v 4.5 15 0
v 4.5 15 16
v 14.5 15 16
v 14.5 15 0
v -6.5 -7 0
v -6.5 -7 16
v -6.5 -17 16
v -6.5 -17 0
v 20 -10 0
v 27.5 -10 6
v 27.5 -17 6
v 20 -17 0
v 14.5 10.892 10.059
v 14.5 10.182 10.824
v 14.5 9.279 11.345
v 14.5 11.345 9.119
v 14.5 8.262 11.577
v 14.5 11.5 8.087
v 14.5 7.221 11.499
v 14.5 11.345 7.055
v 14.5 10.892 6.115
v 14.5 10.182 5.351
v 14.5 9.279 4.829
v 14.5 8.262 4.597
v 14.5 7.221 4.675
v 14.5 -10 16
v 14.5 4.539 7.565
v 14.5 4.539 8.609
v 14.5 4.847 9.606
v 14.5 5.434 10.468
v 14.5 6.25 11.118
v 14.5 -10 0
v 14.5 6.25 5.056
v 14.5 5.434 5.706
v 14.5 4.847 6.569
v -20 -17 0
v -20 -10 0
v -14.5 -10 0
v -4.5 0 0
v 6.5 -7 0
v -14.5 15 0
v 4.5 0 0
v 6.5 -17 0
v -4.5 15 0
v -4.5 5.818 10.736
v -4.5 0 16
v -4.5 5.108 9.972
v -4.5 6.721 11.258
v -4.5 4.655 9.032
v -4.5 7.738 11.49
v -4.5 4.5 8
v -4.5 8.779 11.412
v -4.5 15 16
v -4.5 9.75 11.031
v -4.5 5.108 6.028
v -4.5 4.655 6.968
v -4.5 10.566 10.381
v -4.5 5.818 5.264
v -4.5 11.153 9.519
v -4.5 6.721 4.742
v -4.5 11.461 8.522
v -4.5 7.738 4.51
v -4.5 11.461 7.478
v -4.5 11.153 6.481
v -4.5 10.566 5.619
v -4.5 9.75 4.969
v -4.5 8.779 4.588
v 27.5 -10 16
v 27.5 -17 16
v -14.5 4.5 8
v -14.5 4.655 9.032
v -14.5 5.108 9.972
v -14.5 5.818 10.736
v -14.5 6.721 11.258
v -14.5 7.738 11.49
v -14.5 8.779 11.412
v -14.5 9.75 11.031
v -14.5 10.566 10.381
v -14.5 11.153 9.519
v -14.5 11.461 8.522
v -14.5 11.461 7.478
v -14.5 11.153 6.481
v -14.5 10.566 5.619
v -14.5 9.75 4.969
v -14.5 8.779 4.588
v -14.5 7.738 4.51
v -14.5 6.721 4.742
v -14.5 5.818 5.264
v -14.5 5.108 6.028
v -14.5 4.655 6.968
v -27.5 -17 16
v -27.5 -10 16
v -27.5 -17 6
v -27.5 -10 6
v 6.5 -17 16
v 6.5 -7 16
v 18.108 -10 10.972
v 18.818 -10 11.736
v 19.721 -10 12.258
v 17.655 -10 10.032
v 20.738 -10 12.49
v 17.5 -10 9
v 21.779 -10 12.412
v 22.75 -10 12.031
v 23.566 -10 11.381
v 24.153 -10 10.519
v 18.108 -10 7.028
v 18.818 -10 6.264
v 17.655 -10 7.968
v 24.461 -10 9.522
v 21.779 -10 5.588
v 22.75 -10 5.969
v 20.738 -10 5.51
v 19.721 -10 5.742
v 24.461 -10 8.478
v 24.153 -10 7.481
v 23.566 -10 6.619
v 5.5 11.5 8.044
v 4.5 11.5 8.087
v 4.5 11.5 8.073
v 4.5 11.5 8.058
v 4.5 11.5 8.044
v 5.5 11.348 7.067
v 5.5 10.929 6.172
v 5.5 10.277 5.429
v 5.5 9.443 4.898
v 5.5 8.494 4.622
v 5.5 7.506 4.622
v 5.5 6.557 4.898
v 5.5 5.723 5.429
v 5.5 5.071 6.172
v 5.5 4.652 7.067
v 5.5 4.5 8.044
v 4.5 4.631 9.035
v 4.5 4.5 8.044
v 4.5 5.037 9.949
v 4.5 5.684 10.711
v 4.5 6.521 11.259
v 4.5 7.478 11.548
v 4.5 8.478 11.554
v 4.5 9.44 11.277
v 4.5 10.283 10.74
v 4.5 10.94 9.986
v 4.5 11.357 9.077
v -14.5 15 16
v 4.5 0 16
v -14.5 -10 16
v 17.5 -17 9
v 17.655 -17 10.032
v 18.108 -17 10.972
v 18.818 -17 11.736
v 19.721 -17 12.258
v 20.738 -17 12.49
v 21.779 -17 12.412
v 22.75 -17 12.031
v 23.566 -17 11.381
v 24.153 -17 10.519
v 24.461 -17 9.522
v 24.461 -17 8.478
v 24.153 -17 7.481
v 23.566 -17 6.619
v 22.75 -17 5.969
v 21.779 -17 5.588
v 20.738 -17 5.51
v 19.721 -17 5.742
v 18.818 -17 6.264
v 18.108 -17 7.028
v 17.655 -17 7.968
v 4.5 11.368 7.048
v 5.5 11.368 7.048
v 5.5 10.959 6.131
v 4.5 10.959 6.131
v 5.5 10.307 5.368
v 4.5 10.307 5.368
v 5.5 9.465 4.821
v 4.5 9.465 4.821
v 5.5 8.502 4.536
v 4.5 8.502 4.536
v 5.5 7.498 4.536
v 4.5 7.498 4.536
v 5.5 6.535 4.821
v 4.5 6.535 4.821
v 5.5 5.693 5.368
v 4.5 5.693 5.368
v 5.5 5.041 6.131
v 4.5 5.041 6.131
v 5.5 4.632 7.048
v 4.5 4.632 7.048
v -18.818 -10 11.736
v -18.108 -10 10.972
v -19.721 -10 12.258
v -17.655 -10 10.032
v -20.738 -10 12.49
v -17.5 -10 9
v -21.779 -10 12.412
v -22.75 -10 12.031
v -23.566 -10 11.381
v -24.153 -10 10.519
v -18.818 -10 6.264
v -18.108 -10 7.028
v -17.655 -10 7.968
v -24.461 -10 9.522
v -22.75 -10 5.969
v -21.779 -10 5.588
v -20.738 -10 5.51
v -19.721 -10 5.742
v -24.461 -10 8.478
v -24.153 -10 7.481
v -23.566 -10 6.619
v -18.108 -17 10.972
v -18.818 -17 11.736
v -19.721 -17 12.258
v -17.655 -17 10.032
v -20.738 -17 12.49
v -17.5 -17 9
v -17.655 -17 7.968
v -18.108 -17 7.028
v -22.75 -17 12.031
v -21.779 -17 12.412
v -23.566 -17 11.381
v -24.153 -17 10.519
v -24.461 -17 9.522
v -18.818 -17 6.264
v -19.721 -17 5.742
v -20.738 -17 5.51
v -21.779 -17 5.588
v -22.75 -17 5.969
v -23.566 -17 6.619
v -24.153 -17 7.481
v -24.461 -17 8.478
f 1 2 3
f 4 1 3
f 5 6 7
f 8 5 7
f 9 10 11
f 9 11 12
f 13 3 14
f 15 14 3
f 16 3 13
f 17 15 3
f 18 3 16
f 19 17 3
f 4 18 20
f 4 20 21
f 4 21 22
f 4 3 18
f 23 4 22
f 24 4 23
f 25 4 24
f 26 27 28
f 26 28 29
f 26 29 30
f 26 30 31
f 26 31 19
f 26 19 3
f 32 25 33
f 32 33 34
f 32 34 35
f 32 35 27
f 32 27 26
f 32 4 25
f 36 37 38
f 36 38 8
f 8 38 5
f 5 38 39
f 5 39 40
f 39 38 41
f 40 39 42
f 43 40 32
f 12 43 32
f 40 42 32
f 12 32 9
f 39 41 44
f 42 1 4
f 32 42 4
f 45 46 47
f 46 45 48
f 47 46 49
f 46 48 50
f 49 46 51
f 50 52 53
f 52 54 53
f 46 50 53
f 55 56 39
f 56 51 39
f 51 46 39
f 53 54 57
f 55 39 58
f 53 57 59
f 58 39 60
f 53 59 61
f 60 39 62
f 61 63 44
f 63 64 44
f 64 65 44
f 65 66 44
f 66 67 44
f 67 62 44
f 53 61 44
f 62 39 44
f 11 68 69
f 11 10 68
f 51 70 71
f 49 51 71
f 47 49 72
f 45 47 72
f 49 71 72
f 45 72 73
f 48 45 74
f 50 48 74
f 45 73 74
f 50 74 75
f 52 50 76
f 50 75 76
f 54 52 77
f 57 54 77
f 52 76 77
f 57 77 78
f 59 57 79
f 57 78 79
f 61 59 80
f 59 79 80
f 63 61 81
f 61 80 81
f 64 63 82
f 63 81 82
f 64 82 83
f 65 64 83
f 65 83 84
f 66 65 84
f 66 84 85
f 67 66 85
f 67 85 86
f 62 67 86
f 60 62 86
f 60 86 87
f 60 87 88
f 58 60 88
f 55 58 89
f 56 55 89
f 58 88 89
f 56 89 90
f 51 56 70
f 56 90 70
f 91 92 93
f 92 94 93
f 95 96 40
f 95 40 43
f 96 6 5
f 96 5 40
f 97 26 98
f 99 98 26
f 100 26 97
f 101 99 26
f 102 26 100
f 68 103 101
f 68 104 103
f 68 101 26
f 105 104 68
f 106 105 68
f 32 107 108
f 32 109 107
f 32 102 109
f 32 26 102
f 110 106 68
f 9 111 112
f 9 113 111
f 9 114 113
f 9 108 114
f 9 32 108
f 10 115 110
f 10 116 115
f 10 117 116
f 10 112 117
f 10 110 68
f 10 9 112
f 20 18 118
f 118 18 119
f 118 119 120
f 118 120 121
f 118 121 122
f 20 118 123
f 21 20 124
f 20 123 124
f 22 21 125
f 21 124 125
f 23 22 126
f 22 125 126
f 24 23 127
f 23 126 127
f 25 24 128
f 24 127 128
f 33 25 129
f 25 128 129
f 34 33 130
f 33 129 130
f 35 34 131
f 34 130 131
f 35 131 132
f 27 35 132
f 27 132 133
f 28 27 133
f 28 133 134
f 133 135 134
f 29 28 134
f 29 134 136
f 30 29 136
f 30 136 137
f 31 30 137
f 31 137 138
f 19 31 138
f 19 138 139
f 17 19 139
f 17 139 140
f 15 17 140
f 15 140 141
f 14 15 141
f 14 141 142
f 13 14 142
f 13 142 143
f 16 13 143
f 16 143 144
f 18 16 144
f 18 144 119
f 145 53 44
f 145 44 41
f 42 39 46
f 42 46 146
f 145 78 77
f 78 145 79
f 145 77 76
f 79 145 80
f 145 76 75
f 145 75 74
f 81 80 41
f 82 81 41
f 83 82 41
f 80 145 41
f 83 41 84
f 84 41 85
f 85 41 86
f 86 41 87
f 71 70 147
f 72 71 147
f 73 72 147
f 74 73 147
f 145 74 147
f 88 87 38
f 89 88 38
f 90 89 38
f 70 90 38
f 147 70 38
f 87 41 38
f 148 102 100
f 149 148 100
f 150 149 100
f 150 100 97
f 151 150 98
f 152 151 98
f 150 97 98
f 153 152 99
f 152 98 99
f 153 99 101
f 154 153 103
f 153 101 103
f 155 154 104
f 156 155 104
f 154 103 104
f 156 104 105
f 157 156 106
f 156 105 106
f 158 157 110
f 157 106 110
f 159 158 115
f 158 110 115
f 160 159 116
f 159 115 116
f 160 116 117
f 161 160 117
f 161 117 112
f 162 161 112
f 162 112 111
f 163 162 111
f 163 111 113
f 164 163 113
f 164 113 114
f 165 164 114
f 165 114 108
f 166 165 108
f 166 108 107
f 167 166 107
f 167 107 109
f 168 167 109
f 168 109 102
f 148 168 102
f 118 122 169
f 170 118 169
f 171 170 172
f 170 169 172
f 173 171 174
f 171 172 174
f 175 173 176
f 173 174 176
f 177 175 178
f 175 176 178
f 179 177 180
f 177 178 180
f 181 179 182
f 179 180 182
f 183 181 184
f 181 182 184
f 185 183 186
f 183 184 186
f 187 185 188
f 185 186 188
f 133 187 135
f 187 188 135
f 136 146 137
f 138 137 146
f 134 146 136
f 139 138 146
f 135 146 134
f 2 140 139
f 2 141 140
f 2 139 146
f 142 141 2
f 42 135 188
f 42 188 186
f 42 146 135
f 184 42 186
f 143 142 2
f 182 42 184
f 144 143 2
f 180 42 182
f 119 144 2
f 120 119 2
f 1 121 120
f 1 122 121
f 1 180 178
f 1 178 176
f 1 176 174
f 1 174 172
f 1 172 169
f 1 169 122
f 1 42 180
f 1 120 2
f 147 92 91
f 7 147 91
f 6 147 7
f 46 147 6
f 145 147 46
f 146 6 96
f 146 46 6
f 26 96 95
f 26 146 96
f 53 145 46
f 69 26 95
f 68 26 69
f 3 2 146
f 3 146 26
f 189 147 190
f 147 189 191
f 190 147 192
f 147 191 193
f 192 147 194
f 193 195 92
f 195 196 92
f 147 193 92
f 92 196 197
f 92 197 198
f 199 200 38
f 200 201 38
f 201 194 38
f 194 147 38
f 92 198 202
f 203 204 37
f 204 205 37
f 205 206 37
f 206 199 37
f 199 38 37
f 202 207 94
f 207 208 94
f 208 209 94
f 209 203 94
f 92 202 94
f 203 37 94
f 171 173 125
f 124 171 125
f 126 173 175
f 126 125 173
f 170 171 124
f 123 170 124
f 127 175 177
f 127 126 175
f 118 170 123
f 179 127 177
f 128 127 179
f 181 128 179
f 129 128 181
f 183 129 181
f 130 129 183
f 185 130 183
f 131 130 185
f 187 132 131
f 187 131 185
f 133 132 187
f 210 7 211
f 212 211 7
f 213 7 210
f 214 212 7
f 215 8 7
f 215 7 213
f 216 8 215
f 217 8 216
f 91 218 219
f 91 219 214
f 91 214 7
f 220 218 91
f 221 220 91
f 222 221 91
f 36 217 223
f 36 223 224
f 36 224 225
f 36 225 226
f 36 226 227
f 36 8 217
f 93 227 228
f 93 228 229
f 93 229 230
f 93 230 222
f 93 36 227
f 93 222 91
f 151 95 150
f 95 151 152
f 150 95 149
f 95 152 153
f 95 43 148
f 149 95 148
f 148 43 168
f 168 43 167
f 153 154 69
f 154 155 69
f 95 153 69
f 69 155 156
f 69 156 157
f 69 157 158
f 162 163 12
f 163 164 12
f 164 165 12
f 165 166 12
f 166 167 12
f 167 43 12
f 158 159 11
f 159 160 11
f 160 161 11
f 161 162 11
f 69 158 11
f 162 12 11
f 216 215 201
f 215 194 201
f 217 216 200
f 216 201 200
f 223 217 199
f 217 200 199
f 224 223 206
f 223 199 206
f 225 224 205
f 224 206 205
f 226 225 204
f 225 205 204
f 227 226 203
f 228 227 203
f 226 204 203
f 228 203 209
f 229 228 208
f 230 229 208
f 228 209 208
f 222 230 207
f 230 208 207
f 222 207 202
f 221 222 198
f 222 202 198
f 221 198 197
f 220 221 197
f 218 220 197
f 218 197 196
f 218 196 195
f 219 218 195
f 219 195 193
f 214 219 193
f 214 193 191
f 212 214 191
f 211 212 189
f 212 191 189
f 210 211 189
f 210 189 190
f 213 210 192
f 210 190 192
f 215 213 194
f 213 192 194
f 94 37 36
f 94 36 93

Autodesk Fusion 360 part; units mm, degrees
sketch "Boceto1" plane through (0, 0, 0) normal (0, 0, 1) x (1, 0, 0)
  line L0 (0, 0) -> (4.5, 0)
  line L1 (4.5, 0) -> (4.5, 15)
  line L2 (4.5, 15) -> (14.5, 15)
  line L3 (14.5, 15) -> (14.5, -10)
  line L4 (14.5, -10) -> (27.5, -10)
  line L5 (27.5, -10) -> (27.5, -17)
  line L6 (0, -7) -> (6.5, -7)
  line L7 (6.5, -7) -> (6.5, -17)
  line L8 (6.5, -17) -> (27.5, -17)
  line L9 (0, -7) -> (-6.5, -7)
  line L10 (-27.5, -10) -> (-27.5, -17)
  line L11 (-6.5, -7) -> (-6.5, -17)
  line L12 (-6.5, -17) -> (-27.5, -17)
  line L13 (-14.5, -10) -> (-27.5, -10)
  line L14 (-4.5, 0) -> (-4.5, 15)
  line L15 (-14.5, 15) -> (-14.5, -10)
  line L16 (0, 0) -> (-4.5, 0)
  line L17 (-4.5, 15) -> (-14.5, 15)
  dimension "d1" = 4.5
  dimension "d2" = 15
  dimension "d3" = 10
  dimension "d4" = 25
  dimension "d5" = 13
  dimension "d6" = 7
  dimension "d7" = 6.5
  dimension "d8" = 7
  dimension "d9" = 32
extrude "Extruir1" add sketch "Boceto1" along normal blind 16
sketch "Boceto2" plane through (0, 0, 0) normal (1, 0, 0) x (0, 1, 0)
  circle A0 centre (8, 8.0871) radius 3.5
  line L0 (15, 0) -> (15, 16)
  dimension "d12" = 7
  dimension "d13" = 7
sketch "Boceto3" plane through (-14.5, 0, 0) normal (-1, 0, 0) x (0, -1, 0)
  line L0 (-15, 0) -> (10, 0)
  line L1 (10, 0) -> (10, 16)
  line L2 (10, 16) -> (-15, 16)
  line L3 (-15, 16) -> (-15, 0)
  circle A0 centre (-8, 8) radius 3.5
  dimension "d14" = 7
extrude "Extruir2" cut sketch "Boceto2" along normal blind 20
extrude "Extruir3" cut sketch "Boceto3" against normal blind 20 contours A0
sketch "Boceto4" plane through (0, -10, 0) normal (0, 1, 0) x (-1, 0, 0)
  line L0 (-27.5, 0) -> (-14.5, 0)
  line L1 (-14.5, 0) -> (-14.5, 16)
  line L2 (-14.5, 16) -> (-27.5, 16)
  line L3 (-27.5, 16) -> (-27.5, 0)
  line L4 (-27.5, 0) -> (-20, 0)
  line L5 (-27.5, 6) -> (-27.5, 0)
  line L6 (-27.5, 6) -> (-20, 0)
extrude "Extruir4" cut sketch "Boceto4" against normal blind 8 contours L0 L3 L4 L5 L6
mirror "Simetría1" about plane through (0, 0, 0) normal (1, 0, 0) of "Extruir4"
sketch "Boceto5" plane through (0, -10, 0) normal (0, 1, 0) x (-1, 0, 0)
  line L0 (-27.5, 6) -> (-20, 0)
  line L1 (-20, 0) -> (-14.5, 0)
  line L2 (-14.5, 0) -> (-14.5, 16)
  line L3 (-14.5, 16) -> (-27.5, 16)
  line L4 (-27.5, 16) -> (-27.5, 6)
  circle A0 centre (-21, 9) radius 3.5
  dimension "d27" = 7
  dimension "d28" = 7
extrude "Extruir5" cut sketch "Boceto5" against normal blind 10 contours A0
mirror "Simetría2" about plane through (0, 0, 0) normal (1, 0, 0) of "Extruir5"
